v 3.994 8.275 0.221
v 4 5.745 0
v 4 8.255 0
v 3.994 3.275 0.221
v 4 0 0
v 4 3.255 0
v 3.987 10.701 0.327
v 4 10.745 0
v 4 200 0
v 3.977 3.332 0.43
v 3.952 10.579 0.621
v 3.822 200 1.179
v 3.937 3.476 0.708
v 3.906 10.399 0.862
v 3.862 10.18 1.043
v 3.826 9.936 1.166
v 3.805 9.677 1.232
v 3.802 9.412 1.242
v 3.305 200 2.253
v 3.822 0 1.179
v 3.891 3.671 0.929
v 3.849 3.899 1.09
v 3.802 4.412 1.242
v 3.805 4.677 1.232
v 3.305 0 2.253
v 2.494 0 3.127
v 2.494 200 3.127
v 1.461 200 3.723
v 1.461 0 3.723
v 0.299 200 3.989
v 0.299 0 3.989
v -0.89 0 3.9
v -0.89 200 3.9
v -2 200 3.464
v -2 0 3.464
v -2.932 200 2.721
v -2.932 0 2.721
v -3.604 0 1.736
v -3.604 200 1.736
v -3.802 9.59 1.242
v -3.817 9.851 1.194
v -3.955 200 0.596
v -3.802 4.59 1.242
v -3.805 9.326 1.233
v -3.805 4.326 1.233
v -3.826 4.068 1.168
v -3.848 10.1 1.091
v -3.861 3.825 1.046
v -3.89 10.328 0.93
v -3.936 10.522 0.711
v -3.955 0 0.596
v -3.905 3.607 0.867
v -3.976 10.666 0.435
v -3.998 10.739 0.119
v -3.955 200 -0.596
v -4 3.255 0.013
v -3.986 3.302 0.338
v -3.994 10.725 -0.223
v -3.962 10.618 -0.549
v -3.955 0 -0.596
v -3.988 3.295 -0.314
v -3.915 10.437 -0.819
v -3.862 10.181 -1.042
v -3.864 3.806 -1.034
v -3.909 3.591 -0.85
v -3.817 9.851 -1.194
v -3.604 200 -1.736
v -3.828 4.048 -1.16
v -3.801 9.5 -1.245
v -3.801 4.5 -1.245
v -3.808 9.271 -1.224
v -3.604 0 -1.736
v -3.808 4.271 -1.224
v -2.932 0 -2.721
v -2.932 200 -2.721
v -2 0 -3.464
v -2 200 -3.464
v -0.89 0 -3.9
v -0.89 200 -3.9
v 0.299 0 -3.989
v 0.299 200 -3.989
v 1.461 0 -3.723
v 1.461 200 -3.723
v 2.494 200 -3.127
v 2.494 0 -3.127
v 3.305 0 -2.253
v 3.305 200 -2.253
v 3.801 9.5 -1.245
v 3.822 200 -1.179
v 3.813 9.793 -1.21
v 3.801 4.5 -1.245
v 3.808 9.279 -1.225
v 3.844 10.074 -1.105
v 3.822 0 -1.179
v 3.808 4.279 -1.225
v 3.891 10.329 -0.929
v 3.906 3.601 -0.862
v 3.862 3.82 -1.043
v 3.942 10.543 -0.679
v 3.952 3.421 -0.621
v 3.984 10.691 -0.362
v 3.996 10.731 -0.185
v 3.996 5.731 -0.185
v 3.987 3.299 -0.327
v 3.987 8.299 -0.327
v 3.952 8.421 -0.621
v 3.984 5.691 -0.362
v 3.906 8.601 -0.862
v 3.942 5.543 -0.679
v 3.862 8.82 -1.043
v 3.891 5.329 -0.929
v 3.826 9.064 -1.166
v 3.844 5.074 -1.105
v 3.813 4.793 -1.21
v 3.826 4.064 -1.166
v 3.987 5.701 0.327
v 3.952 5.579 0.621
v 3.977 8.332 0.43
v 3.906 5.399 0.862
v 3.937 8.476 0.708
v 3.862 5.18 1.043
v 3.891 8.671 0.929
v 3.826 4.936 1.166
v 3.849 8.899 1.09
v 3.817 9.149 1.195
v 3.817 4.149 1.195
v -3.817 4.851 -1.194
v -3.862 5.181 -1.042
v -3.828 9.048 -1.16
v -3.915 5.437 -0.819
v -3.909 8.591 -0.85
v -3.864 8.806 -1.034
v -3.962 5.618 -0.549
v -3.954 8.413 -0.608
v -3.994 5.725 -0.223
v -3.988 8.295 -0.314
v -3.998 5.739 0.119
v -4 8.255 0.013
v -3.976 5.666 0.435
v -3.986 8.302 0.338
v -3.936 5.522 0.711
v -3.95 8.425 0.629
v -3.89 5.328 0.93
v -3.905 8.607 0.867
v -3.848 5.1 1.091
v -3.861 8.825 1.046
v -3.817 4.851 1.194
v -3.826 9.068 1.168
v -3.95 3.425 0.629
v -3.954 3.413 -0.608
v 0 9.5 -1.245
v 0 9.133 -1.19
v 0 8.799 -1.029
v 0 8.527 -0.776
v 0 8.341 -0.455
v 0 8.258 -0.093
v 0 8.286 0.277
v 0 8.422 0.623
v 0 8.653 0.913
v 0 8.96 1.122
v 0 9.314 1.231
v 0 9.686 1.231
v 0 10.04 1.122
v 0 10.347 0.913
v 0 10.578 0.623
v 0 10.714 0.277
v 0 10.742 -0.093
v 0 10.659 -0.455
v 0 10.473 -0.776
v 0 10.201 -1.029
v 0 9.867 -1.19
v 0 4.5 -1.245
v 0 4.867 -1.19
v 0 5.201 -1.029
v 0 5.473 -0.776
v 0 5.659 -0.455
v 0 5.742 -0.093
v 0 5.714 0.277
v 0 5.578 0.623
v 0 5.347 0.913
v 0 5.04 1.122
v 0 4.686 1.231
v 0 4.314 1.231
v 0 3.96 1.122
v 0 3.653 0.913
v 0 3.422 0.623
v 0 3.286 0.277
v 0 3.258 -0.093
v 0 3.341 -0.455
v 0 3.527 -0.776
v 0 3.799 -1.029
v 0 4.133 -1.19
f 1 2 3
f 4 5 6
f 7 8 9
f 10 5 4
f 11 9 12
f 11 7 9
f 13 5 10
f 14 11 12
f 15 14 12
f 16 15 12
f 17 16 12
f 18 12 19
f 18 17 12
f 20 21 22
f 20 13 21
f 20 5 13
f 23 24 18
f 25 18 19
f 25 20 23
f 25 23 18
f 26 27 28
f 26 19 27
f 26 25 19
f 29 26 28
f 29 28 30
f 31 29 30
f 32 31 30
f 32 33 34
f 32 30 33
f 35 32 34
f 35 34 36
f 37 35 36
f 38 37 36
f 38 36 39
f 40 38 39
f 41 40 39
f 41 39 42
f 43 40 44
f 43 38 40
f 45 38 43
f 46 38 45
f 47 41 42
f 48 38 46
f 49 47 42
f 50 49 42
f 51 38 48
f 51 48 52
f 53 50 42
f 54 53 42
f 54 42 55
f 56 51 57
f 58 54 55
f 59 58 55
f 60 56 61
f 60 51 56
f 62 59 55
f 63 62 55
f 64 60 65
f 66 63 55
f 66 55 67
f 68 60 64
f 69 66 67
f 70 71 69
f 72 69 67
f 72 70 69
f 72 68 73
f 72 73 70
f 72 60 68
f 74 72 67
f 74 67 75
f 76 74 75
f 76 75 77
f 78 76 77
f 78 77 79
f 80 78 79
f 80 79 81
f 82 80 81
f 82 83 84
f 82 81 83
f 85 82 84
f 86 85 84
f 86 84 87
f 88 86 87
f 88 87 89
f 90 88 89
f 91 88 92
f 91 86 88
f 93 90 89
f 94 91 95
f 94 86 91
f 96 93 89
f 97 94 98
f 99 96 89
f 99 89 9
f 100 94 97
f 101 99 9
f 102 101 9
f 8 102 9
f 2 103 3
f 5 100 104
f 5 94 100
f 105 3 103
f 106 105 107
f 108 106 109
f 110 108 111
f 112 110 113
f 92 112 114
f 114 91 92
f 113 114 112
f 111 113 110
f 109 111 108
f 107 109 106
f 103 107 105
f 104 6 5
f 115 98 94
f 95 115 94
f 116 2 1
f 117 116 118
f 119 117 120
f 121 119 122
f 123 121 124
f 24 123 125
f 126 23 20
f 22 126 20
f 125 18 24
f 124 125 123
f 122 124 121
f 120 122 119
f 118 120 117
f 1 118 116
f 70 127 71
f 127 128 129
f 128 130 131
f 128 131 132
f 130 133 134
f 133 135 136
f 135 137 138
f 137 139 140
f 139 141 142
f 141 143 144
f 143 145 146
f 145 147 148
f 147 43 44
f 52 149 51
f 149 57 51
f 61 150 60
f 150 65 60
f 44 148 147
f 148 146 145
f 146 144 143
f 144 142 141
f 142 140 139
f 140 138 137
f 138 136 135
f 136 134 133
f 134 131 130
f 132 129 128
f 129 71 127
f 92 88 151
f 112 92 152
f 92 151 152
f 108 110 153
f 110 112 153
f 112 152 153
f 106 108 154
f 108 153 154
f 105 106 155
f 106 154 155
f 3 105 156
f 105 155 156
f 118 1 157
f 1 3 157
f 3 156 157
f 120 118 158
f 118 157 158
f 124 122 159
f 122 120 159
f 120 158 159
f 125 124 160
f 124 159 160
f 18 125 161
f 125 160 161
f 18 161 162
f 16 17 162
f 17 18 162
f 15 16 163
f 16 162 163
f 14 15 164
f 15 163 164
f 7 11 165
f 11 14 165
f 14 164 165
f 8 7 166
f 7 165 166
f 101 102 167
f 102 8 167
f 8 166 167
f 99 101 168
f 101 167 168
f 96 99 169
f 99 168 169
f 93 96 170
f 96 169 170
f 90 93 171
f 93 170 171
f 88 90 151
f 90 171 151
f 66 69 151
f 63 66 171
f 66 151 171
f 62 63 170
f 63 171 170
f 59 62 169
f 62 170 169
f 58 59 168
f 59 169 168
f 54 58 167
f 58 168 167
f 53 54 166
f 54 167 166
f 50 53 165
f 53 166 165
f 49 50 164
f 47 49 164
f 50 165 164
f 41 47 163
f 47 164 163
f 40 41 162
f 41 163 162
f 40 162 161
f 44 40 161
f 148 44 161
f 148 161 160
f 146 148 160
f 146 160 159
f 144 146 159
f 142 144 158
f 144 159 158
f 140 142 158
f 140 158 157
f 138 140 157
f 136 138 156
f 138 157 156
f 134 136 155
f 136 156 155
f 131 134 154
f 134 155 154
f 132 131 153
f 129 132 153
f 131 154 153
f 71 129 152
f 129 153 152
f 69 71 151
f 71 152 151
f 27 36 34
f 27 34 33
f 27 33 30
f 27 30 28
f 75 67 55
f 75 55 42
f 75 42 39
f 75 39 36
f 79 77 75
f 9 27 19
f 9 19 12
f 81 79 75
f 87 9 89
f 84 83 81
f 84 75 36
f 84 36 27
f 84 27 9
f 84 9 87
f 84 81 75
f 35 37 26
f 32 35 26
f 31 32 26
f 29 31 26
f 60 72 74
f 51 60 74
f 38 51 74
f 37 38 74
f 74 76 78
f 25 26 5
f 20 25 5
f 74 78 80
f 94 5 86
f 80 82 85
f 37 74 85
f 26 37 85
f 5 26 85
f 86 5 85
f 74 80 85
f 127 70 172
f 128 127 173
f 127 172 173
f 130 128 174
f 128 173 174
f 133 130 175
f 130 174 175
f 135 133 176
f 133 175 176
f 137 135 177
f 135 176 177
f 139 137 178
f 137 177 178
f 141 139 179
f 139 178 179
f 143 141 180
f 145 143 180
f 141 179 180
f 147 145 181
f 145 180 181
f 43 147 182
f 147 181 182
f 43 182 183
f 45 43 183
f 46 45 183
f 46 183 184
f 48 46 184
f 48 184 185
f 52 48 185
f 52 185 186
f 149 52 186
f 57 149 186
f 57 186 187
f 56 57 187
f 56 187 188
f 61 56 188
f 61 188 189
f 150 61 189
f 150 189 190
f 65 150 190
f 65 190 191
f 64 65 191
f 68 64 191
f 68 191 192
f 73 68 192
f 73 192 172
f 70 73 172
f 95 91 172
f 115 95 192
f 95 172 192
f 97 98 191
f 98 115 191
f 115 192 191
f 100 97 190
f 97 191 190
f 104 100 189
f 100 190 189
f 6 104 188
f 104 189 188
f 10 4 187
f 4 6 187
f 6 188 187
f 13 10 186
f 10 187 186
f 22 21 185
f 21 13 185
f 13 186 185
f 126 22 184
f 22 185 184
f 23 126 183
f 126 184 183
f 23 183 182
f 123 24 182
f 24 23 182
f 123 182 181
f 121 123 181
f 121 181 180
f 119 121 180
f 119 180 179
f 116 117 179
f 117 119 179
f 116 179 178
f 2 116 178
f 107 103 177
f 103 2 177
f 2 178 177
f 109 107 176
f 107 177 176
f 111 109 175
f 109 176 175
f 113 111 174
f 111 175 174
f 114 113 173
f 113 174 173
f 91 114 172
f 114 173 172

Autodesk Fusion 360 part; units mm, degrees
sketch "Sketch1" plane through (0, 0, 0) normal (0, 1, 0) x (1, 0, 0)
  circle A0 centre (0, 0) radius 4
  dimension "d1" = 8
extrude "Extrude1" add sketch "Sketch1" along normal blind 200
sketch "Sketch2" plane through (0, 0, 0) normal (1, 0, 0) x (0, 0, -1)
  circle A0 centre (0, 4.5) radius 1.245
  circle A1 centre (0, 9.5) radius 1.245
  line L0 (4, 0) -> (-4, 0)
  line L1 (0, 0) -> (0, 13) construction
  dimension "d4" = 2.49
  dimension "d5" = 5
  dimension "d6" = 4.5
extrude "Extrude2" cut sketch "Sketch2" along normal through all and the other way through all
